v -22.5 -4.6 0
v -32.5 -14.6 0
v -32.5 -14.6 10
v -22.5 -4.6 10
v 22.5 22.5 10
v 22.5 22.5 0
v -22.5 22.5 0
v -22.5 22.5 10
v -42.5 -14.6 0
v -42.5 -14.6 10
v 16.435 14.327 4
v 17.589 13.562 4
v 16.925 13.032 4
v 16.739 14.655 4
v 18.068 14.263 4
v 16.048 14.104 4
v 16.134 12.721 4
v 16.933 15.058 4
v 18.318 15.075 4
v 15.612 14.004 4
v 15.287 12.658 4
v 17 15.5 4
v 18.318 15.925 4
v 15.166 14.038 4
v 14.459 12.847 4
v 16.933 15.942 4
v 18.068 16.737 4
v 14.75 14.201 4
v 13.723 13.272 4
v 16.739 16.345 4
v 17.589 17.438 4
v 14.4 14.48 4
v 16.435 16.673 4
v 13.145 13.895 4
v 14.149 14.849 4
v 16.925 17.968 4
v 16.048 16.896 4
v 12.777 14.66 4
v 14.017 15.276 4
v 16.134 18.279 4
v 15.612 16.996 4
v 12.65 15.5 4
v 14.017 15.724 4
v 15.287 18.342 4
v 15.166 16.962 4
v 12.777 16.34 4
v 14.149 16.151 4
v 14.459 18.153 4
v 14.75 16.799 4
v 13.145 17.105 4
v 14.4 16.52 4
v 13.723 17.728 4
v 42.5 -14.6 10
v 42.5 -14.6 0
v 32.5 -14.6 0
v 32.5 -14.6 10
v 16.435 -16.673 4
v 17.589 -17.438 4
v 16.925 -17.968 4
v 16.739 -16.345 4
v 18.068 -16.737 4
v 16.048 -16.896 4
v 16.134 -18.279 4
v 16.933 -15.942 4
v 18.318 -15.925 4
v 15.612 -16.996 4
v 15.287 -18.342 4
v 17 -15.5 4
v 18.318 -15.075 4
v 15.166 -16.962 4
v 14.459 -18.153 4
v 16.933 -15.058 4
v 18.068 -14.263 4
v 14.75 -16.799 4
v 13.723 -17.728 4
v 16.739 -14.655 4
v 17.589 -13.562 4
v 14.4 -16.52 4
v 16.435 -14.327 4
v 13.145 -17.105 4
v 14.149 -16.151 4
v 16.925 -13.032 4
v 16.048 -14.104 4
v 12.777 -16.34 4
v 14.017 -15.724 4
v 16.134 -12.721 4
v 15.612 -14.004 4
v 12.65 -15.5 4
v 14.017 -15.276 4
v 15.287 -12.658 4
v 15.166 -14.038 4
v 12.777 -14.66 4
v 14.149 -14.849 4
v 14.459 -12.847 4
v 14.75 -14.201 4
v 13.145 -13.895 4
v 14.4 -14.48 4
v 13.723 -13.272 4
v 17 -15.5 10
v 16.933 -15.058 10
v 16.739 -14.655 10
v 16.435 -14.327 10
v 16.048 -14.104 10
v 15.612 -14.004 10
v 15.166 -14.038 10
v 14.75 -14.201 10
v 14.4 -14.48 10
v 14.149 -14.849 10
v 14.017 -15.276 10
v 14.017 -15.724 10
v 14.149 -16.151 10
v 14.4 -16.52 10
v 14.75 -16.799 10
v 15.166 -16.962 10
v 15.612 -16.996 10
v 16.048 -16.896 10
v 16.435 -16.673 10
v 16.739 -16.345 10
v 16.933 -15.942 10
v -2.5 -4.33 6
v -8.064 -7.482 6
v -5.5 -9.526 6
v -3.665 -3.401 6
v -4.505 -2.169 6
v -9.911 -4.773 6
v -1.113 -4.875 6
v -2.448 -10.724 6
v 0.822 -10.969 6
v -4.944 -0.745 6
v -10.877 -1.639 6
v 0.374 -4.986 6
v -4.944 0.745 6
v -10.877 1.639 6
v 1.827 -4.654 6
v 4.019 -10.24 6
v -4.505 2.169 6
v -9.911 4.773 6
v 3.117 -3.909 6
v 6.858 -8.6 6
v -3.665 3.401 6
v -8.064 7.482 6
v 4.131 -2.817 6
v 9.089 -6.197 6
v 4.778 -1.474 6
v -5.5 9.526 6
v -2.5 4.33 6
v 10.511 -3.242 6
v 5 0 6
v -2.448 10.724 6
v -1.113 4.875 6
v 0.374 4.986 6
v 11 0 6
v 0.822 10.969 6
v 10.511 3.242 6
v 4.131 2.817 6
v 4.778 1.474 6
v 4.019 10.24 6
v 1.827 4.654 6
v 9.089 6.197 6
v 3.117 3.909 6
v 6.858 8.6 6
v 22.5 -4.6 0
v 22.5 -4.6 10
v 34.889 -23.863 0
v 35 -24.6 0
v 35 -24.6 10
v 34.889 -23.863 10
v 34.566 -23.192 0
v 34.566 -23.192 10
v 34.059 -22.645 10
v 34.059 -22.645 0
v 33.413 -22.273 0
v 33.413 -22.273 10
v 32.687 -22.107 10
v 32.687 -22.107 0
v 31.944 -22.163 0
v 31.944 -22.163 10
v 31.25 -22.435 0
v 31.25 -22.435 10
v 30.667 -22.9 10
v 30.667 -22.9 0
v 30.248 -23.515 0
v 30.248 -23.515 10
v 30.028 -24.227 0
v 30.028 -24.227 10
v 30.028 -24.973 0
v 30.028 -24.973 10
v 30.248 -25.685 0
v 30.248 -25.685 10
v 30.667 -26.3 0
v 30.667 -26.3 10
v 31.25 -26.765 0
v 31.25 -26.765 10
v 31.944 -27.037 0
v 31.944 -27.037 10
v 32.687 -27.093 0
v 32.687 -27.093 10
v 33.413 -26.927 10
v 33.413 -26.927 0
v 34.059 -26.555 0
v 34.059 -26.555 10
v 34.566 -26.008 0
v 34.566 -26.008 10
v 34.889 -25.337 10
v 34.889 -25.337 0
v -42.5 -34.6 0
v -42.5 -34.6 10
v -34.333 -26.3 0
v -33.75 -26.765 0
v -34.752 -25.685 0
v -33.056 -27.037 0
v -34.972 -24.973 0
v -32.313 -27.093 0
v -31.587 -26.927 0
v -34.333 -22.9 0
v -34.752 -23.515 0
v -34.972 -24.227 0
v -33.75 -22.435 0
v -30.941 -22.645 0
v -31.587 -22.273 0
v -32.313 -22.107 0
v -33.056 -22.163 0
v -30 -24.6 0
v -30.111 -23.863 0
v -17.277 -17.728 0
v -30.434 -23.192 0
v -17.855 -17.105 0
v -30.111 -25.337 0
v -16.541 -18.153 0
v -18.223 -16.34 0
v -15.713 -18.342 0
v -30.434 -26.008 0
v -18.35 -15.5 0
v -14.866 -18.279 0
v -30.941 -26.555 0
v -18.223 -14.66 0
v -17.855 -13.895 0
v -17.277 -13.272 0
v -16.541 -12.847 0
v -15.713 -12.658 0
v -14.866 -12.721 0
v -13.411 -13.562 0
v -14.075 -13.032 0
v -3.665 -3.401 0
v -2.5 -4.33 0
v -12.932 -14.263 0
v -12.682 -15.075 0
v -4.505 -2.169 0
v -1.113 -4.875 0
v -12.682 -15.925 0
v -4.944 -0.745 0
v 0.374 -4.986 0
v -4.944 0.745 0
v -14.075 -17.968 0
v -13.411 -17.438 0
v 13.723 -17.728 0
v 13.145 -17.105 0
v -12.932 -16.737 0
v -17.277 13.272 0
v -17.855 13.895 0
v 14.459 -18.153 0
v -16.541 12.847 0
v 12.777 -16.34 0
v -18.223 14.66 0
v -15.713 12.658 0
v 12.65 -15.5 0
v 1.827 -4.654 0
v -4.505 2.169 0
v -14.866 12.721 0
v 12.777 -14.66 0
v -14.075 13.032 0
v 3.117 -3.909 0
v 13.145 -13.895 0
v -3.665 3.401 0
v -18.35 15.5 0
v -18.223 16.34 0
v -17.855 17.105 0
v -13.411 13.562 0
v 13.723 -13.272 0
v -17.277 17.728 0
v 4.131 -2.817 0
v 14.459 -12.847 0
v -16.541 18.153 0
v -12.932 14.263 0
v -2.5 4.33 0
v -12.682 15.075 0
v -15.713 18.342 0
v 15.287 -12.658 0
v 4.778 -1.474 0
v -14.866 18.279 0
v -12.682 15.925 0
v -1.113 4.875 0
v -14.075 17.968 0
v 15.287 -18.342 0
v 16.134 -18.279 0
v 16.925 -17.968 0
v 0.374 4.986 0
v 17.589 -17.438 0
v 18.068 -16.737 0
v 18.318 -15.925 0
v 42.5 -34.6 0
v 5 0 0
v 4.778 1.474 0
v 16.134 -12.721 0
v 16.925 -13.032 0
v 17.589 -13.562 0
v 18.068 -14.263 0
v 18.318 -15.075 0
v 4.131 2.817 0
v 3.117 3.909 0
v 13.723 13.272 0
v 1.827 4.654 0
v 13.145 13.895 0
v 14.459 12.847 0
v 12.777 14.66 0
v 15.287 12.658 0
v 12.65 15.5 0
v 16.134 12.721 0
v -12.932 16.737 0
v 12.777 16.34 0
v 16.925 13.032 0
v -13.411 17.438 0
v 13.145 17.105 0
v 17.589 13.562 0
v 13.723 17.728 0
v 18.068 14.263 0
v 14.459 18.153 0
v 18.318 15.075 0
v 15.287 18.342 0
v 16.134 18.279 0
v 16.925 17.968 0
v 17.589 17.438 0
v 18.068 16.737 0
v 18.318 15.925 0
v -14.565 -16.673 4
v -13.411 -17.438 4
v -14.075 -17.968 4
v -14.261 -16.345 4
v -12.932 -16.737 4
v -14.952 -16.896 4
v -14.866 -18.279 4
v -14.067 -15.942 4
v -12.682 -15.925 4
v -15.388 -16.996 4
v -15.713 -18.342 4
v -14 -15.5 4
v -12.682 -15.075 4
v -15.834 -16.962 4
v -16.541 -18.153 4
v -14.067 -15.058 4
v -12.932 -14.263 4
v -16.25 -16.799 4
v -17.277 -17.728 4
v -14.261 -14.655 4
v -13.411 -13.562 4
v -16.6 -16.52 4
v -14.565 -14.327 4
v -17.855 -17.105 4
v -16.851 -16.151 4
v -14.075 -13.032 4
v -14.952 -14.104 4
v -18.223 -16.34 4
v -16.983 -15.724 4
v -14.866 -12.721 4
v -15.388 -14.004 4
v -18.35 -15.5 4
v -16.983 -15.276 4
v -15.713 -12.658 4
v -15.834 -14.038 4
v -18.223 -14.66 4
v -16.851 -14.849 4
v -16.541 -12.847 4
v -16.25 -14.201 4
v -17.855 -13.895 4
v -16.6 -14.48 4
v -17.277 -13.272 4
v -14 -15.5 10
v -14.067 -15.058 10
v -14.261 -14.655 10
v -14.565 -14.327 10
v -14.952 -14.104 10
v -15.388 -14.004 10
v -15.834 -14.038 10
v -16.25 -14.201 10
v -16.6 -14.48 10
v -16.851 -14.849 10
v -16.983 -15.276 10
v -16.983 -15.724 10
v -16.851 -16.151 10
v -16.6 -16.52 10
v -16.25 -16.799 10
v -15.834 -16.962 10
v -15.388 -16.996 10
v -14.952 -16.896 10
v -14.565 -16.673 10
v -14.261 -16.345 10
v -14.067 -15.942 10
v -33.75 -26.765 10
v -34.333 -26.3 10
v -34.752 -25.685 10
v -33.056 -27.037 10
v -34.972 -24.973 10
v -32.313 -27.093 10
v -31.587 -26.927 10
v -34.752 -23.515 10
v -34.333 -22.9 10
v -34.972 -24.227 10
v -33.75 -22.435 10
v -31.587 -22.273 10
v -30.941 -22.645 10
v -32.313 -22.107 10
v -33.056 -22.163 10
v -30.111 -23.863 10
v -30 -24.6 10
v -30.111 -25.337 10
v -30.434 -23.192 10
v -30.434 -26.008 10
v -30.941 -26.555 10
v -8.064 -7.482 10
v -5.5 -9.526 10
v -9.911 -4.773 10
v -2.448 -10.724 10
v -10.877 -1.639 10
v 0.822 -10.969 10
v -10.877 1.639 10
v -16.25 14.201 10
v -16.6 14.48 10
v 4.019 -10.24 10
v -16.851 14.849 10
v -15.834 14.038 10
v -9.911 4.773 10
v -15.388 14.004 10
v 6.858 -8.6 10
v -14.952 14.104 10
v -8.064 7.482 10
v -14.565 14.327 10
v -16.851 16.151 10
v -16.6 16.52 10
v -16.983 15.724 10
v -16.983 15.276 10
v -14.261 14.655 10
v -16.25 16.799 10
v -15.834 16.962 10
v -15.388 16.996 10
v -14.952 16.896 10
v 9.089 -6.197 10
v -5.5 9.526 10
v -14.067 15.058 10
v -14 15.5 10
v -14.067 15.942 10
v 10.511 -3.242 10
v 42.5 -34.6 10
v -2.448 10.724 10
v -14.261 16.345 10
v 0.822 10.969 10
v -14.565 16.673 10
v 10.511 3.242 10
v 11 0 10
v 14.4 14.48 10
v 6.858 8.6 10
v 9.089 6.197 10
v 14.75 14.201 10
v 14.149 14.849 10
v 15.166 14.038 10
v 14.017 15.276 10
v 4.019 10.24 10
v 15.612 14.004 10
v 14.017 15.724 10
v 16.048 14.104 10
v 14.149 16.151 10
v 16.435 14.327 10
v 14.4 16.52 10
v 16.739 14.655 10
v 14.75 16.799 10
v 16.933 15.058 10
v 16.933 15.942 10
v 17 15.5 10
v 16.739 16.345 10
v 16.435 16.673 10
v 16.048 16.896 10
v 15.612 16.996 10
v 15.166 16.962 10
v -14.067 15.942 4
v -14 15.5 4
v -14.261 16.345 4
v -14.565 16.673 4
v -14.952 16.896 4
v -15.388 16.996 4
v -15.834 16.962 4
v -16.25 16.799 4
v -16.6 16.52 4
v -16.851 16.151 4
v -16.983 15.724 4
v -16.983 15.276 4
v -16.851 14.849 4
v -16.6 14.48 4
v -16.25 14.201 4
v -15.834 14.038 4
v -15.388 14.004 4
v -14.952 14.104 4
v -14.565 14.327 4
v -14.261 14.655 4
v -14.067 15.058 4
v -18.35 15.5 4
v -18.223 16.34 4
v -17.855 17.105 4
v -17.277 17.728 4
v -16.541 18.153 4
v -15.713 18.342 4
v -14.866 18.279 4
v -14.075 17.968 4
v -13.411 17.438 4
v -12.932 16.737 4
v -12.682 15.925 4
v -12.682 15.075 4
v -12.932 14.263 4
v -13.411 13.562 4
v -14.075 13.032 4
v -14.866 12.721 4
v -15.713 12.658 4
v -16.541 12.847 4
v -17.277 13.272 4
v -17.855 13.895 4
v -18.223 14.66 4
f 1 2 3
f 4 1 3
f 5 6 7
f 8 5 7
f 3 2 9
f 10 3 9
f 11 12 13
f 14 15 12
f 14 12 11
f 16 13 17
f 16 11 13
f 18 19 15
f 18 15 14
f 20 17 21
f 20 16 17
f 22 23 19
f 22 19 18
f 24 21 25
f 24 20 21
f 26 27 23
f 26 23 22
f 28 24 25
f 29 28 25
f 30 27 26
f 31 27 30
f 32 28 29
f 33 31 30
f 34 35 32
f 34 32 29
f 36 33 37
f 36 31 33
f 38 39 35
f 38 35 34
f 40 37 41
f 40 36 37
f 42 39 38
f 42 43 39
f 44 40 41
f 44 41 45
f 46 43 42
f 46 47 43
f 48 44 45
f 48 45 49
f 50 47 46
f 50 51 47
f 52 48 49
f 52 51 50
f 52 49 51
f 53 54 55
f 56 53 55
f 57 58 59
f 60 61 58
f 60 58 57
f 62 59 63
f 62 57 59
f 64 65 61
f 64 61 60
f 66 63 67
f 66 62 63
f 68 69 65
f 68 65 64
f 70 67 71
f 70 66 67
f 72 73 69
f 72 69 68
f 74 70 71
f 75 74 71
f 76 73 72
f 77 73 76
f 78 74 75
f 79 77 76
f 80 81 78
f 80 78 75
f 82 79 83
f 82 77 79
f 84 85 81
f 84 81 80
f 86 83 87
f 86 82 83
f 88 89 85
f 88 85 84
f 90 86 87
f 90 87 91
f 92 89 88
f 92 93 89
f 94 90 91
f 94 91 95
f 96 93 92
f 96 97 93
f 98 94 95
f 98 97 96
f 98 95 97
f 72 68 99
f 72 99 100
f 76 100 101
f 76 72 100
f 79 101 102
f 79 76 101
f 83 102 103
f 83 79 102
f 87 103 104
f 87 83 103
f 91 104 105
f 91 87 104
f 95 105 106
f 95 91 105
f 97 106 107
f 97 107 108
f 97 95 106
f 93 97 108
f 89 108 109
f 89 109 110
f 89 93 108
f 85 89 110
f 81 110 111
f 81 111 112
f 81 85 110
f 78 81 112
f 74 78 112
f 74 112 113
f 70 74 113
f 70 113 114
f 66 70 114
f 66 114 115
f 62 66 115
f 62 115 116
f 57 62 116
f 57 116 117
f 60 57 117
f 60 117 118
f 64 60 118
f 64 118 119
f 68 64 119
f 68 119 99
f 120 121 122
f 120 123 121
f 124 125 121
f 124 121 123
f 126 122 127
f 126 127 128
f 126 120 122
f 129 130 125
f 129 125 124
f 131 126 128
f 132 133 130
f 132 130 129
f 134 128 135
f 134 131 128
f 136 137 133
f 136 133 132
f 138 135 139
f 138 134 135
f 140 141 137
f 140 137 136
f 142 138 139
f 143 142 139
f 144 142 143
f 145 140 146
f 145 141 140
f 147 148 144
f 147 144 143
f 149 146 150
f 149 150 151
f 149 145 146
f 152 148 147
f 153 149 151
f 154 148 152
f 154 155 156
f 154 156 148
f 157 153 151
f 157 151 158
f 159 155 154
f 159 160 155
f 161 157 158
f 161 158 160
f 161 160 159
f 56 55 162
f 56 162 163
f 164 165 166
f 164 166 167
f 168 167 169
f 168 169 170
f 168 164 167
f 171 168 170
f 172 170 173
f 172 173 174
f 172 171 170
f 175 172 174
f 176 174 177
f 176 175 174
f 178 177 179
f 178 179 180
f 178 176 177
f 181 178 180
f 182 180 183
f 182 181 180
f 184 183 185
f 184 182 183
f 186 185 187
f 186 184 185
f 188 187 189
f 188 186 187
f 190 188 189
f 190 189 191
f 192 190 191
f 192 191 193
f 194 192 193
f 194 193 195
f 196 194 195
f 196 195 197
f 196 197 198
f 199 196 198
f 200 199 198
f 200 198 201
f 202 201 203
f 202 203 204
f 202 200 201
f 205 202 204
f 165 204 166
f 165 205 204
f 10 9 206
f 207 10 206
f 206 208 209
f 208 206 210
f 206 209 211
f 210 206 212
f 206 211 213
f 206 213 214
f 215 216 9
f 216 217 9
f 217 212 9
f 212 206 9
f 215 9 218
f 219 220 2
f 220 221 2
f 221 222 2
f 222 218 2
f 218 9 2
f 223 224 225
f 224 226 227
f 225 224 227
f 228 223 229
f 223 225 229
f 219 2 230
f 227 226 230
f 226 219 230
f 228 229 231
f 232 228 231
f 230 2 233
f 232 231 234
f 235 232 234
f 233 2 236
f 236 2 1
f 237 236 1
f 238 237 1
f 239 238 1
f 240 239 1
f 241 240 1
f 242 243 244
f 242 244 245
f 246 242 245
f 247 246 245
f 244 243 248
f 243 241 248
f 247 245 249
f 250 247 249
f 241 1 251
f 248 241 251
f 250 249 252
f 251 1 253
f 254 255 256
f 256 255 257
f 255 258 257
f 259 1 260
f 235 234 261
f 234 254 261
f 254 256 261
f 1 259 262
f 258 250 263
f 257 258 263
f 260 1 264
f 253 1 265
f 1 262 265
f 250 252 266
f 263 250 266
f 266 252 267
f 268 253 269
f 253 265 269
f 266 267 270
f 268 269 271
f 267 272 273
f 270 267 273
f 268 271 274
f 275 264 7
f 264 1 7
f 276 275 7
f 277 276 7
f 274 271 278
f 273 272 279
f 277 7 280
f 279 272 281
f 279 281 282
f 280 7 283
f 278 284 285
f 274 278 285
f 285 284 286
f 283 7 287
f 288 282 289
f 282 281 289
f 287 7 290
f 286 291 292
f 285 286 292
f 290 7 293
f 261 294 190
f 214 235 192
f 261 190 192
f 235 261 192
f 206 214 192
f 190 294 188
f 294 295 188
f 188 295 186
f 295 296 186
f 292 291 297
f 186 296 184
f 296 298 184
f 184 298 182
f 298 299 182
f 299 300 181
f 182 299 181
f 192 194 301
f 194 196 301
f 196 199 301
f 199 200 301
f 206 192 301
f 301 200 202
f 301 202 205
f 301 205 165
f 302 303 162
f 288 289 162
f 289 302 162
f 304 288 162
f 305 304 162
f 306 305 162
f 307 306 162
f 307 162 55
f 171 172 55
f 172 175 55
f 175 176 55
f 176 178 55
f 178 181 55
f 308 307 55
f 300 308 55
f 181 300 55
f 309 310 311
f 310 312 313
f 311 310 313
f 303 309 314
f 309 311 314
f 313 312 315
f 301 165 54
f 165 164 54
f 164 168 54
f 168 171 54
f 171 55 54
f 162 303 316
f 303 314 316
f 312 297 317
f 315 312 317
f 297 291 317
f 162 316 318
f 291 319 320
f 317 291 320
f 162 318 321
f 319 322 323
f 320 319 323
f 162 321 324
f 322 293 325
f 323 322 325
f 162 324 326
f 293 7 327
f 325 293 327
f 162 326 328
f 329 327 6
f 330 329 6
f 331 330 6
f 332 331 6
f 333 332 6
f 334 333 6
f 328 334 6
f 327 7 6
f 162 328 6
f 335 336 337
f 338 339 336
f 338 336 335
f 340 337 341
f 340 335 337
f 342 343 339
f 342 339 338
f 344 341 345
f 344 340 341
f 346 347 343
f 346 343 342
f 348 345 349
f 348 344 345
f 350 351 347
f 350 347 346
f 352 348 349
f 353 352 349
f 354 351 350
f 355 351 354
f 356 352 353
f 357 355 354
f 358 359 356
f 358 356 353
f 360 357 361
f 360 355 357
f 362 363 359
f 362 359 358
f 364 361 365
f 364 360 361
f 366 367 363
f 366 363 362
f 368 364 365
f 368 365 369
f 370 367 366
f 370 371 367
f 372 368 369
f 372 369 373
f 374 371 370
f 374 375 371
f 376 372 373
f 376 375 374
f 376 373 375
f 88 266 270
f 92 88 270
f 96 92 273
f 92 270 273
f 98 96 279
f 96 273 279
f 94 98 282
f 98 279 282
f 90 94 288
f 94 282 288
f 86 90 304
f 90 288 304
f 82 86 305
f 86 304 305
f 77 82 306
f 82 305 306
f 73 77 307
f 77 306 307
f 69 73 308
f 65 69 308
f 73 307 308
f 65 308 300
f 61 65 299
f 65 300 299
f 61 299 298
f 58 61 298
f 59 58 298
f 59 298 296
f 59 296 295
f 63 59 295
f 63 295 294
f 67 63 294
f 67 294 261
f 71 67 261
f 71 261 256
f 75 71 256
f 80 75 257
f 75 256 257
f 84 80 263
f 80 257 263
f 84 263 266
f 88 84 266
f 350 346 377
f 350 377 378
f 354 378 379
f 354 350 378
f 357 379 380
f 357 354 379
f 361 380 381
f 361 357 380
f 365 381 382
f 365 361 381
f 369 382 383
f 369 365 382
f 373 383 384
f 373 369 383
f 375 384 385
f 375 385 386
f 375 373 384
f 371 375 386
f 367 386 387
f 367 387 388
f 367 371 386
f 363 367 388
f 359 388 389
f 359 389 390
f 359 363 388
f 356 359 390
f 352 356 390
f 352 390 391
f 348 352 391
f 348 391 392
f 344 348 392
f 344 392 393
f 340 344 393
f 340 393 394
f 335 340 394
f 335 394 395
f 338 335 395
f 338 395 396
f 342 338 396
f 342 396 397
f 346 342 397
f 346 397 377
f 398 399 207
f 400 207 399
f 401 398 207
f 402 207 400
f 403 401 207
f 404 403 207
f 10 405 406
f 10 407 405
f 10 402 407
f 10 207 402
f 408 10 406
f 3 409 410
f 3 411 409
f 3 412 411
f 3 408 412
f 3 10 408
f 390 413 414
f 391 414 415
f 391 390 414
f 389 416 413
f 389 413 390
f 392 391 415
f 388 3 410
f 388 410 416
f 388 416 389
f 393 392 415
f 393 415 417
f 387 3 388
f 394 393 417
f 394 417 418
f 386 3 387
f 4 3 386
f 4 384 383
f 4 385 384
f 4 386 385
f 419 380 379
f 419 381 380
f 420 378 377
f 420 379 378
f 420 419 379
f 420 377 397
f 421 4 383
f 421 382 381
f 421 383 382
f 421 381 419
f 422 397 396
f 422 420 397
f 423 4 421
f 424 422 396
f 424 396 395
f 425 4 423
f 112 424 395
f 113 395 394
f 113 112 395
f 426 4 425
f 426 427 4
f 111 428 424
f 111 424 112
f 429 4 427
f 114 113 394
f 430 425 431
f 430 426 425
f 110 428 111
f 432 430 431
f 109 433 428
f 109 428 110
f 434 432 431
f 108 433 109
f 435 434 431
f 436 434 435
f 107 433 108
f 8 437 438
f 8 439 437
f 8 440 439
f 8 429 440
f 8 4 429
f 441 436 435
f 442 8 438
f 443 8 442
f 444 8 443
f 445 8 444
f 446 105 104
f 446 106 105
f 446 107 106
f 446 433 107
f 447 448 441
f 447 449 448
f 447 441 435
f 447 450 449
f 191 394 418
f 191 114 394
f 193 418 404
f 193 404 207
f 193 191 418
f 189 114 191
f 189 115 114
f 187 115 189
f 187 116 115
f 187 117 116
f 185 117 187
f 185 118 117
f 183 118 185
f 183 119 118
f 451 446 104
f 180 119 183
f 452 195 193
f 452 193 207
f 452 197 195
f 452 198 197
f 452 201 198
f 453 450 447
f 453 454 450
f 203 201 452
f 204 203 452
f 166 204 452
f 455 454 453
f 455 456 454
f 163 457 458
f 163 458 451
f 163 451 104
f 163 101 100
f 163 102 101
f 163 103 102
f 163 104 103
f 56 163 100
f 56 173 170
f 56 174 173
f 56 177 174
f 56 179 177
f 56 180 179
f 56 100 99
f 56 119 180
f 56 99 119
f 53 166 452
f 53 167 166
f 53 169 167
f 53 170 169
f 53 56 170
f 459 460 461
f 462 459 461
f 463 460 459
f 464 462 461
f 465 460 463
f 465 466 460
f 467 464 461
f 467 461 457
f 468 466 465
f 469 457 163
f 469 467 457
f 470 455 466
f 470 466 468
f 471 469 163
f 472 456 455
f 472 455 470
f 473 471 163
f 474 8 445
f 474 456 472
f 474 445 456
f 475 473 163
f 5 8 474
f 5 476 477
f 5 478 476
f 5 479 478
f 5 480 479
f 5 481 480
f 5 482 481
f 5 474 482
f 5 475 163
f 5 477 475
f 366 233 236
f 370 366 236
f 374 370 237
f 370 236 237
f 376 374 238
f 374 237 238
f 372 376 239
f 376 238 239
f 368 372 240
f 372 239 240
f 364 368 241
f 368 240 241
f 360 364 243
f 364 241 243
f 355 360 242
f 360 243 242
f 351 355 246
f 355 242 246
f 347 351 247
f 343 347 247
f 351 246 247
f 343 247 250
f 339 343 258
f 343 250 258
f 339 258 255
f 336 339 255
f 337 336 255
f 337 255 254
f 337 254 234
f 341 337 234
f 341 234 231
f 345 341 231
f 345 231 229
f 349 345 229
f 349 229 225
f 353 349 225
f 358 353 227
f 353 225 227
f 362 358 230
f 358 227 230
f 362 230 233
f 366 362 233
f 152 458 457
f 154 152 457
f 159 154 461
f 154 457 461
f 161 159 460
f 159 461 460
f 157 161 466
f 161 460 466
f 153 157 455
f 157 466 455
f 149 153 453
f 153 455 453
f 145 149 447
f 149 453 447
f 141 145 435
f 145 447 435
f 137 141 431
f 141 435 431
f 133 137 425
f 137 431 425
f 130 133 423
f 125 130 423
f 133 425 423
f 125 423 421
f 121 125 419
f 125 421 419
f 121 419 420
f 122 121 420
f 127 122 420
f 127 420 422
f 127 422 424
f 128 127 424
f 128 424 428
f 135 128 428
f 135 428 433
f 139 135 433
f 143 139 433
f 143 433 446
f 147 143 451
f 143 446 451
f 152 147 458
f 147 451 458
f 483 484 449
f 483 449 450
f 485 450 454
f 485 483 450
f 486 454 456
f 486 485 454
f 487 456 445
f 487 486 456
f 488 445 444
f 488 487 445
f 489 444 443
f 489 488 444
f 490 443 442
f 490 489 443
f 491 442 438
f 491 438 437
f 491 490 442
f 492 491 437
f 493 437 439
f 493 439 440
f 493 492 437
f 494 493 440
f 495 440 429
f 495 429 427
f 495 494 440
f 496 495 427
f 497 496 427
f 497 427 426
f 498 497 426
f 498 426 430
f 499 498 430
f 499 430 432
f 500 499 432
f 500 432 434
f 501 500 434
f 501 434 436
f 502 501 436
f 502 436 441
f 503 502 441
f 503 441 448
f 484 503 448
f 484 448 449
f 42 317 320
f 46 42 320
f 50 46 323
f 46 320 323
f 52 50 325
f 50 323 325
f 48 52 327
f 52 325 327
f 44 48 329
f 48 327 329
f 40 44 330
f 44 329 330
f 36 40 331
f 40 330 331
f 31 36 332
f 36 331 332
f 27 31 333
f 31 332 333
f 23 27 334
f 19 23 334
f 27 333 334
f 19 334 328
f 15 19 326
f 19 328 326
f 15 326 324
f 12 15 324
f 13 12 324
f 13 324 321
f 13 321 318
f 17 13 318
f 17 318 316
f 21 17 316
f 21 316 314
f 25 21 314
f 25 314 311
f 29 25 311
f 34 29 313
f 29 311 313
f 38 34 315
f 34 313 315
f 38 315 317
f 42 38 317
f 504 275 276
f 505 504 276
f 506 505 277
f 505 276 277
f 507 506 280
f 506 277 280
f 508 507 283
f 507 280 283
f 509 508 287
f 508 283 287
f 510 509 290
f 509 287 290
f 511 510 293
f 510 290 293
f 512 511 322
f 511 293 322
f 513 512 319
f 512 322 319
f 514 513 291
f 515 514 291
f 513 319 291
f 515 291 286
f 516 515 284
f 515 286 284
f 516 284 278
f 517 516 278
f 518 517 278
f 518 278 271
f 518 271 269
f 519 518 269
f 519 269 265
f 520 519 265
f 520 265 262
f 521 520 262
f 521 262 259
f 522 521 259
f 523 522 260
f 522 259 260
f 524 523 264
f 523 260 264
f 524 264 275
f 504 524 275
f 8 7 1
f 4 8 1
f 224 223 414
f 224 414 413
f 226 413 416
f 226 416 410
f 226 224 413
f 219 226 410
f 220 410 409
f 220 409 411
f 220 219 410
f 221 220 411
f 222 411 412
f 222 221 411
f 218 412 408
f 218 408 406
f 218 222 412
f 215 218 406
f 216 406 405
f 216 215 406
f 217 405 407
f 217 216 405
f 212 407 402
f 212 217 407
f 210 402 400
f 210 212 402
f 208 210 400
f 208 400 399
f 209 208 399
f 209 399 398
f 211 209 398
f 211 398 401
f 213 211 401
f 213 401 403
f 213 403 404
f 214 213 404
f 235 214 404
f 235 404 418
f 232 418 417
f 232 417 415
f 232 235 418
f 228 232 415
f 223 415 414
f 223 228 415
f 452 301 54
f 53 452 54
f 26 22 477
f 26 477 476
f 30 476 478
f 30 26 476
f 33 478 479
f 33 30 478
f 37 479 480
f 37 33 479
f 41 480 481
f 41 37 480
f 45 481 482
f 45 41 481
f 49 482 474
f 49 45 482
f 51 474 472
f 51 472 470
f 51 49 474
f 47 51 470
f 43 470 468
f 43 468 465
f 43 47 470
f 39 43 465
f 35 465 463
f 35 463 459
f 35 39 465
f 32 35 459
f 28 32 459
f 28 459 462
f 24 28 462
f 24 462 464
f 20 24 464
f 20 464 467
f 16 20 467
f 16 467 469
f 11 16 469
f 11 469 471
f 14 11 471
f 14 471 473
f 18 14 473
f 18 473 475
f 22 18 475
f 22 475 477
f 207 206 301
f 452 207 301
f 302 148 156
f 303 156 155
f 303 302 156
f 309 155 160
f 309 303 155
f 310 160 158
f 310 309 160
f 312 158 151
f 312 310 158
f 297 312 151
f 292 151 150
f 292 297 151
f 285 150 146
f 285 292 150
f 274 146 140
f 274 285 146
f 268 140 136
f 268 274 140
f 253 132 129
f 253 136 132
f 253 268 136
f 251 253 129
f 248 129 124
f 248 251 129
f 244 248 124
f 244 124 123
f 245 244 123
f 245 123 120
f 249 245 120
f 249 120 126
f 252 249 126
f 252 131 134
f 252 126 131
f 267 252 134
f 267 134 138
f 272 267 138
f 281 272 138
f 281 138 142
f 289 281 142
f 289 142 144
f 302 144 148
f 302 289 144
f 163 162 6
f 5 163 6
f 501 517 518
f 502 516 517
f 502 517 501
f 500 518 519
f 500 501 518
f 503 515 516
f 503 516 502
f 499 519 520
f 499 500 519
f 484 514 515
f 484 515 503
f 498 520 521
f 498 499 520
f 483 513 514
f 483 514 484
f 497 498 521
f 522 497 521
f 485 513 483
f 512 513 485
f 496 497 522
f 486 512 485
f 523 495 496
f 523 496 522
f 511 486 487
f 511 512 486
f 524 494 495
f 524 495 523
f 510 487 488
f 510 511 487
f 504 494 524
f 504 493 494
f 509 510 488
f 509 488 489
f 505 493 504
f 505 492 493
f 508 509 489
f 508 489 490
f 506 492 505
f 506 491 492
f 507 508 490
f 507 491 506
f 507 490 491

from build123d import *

# Parameters (mm, degrees)
SKETCH1_R           = 1.5
SKETCH1_R_2         = 2.5
SKETCH1_R_3         = 5
BOSS_EXTRUDE1_DEPTH = 10
SKETCH2_R           = 11
CUT_EXTRUDE1_DEPTH  = 4
CHAMFER1_SIZE       = 10
SKETCH3_R           = 2.85
CUT_EXTRUDE2_DEPTH  = 4


with BuildPart() as part:
    # Sketch1 → Boss-Extrude1 (new body)
    with BuildSketch(Plane.XY):
        Polygon((22.5, 22.5), (-22.5, 22.5), (-22.5, -14.6), (-42.5, -14.6), (-42.5, -34.6), (42.5, -34.6), (42.5, -14.6), (22.5, -14.6), align=None)
        with Locations((-15.5, 15.5)):
            Circle(SKETCH1_R, mode=Mode.SUBTRACT)
        with Locations((15.5, 15.5)):
            Circle(SKETCH1_R, mode=Mode.SUBTRACT)
        with Locations((32.5, -24.6)):
            Circle(SKETCH1_R_2, mode=Mode.SUBTRACT)
        with Locations((-32.5, -24.6)):
            Circle(SKETCH1_R_2, mode=Mode.SUBTRACT)
        Circle(SKETCH1_R_3, mode=Mode.SUBTRACT)
        with Locations((15.5, -15.5)):
            Circle(SKETCH1_R, mode=Mode.SUBTRACT)
        with Locations((-15.5, -15.5)):
            Circle(SKETCH1_R, mode=Mode.SUBTRACT)
    extrude(amount=BOSS_EXTRUDE1_DEPTH)

    # Sketch2 → Cut-Extrude1 (cut)
    with BuildSketch(Plane.XY.offset(10)):
        Circle(SKETCH2_R)
    extrude(amount=-CUT_EXTRUDE1_DEPTH, mode=Mode.SUBTRACT)

    # Chamfer1
    chamfer1_edges = [part.edges().sort_by_distance(p)[0] for p in [
        (22.5, -14.6, 5),
        (-22.5, -14.6, 5),
    ]]
    chamfer(chamfer1_edges, length=CHAMFER1_SIZE)

    # Sketch3 → Cut-Extrude2 (cut)
    with BuildSketch(Plane(origin=(0, 0, 0), x_dir=(-1, 0, 0), z_dir=(0, 0, -1))):
        with Locations((-15.5, 15.5)):
            Circle(SKETCH3_R)
        with Locations((15.5, 15.5)):
            Circle(SKETCH3_R)
        with Locations((-15.5, -15.5)):
            Circle(SKETCH3_R)
        with Locations((15.5, -15.5)):
            Circle(SKETCH3_R)
    extrude(amount=-CUT_EXTRUDE2_DEPTH, mode=Mode.SUBTRACT)


solid = part.part
